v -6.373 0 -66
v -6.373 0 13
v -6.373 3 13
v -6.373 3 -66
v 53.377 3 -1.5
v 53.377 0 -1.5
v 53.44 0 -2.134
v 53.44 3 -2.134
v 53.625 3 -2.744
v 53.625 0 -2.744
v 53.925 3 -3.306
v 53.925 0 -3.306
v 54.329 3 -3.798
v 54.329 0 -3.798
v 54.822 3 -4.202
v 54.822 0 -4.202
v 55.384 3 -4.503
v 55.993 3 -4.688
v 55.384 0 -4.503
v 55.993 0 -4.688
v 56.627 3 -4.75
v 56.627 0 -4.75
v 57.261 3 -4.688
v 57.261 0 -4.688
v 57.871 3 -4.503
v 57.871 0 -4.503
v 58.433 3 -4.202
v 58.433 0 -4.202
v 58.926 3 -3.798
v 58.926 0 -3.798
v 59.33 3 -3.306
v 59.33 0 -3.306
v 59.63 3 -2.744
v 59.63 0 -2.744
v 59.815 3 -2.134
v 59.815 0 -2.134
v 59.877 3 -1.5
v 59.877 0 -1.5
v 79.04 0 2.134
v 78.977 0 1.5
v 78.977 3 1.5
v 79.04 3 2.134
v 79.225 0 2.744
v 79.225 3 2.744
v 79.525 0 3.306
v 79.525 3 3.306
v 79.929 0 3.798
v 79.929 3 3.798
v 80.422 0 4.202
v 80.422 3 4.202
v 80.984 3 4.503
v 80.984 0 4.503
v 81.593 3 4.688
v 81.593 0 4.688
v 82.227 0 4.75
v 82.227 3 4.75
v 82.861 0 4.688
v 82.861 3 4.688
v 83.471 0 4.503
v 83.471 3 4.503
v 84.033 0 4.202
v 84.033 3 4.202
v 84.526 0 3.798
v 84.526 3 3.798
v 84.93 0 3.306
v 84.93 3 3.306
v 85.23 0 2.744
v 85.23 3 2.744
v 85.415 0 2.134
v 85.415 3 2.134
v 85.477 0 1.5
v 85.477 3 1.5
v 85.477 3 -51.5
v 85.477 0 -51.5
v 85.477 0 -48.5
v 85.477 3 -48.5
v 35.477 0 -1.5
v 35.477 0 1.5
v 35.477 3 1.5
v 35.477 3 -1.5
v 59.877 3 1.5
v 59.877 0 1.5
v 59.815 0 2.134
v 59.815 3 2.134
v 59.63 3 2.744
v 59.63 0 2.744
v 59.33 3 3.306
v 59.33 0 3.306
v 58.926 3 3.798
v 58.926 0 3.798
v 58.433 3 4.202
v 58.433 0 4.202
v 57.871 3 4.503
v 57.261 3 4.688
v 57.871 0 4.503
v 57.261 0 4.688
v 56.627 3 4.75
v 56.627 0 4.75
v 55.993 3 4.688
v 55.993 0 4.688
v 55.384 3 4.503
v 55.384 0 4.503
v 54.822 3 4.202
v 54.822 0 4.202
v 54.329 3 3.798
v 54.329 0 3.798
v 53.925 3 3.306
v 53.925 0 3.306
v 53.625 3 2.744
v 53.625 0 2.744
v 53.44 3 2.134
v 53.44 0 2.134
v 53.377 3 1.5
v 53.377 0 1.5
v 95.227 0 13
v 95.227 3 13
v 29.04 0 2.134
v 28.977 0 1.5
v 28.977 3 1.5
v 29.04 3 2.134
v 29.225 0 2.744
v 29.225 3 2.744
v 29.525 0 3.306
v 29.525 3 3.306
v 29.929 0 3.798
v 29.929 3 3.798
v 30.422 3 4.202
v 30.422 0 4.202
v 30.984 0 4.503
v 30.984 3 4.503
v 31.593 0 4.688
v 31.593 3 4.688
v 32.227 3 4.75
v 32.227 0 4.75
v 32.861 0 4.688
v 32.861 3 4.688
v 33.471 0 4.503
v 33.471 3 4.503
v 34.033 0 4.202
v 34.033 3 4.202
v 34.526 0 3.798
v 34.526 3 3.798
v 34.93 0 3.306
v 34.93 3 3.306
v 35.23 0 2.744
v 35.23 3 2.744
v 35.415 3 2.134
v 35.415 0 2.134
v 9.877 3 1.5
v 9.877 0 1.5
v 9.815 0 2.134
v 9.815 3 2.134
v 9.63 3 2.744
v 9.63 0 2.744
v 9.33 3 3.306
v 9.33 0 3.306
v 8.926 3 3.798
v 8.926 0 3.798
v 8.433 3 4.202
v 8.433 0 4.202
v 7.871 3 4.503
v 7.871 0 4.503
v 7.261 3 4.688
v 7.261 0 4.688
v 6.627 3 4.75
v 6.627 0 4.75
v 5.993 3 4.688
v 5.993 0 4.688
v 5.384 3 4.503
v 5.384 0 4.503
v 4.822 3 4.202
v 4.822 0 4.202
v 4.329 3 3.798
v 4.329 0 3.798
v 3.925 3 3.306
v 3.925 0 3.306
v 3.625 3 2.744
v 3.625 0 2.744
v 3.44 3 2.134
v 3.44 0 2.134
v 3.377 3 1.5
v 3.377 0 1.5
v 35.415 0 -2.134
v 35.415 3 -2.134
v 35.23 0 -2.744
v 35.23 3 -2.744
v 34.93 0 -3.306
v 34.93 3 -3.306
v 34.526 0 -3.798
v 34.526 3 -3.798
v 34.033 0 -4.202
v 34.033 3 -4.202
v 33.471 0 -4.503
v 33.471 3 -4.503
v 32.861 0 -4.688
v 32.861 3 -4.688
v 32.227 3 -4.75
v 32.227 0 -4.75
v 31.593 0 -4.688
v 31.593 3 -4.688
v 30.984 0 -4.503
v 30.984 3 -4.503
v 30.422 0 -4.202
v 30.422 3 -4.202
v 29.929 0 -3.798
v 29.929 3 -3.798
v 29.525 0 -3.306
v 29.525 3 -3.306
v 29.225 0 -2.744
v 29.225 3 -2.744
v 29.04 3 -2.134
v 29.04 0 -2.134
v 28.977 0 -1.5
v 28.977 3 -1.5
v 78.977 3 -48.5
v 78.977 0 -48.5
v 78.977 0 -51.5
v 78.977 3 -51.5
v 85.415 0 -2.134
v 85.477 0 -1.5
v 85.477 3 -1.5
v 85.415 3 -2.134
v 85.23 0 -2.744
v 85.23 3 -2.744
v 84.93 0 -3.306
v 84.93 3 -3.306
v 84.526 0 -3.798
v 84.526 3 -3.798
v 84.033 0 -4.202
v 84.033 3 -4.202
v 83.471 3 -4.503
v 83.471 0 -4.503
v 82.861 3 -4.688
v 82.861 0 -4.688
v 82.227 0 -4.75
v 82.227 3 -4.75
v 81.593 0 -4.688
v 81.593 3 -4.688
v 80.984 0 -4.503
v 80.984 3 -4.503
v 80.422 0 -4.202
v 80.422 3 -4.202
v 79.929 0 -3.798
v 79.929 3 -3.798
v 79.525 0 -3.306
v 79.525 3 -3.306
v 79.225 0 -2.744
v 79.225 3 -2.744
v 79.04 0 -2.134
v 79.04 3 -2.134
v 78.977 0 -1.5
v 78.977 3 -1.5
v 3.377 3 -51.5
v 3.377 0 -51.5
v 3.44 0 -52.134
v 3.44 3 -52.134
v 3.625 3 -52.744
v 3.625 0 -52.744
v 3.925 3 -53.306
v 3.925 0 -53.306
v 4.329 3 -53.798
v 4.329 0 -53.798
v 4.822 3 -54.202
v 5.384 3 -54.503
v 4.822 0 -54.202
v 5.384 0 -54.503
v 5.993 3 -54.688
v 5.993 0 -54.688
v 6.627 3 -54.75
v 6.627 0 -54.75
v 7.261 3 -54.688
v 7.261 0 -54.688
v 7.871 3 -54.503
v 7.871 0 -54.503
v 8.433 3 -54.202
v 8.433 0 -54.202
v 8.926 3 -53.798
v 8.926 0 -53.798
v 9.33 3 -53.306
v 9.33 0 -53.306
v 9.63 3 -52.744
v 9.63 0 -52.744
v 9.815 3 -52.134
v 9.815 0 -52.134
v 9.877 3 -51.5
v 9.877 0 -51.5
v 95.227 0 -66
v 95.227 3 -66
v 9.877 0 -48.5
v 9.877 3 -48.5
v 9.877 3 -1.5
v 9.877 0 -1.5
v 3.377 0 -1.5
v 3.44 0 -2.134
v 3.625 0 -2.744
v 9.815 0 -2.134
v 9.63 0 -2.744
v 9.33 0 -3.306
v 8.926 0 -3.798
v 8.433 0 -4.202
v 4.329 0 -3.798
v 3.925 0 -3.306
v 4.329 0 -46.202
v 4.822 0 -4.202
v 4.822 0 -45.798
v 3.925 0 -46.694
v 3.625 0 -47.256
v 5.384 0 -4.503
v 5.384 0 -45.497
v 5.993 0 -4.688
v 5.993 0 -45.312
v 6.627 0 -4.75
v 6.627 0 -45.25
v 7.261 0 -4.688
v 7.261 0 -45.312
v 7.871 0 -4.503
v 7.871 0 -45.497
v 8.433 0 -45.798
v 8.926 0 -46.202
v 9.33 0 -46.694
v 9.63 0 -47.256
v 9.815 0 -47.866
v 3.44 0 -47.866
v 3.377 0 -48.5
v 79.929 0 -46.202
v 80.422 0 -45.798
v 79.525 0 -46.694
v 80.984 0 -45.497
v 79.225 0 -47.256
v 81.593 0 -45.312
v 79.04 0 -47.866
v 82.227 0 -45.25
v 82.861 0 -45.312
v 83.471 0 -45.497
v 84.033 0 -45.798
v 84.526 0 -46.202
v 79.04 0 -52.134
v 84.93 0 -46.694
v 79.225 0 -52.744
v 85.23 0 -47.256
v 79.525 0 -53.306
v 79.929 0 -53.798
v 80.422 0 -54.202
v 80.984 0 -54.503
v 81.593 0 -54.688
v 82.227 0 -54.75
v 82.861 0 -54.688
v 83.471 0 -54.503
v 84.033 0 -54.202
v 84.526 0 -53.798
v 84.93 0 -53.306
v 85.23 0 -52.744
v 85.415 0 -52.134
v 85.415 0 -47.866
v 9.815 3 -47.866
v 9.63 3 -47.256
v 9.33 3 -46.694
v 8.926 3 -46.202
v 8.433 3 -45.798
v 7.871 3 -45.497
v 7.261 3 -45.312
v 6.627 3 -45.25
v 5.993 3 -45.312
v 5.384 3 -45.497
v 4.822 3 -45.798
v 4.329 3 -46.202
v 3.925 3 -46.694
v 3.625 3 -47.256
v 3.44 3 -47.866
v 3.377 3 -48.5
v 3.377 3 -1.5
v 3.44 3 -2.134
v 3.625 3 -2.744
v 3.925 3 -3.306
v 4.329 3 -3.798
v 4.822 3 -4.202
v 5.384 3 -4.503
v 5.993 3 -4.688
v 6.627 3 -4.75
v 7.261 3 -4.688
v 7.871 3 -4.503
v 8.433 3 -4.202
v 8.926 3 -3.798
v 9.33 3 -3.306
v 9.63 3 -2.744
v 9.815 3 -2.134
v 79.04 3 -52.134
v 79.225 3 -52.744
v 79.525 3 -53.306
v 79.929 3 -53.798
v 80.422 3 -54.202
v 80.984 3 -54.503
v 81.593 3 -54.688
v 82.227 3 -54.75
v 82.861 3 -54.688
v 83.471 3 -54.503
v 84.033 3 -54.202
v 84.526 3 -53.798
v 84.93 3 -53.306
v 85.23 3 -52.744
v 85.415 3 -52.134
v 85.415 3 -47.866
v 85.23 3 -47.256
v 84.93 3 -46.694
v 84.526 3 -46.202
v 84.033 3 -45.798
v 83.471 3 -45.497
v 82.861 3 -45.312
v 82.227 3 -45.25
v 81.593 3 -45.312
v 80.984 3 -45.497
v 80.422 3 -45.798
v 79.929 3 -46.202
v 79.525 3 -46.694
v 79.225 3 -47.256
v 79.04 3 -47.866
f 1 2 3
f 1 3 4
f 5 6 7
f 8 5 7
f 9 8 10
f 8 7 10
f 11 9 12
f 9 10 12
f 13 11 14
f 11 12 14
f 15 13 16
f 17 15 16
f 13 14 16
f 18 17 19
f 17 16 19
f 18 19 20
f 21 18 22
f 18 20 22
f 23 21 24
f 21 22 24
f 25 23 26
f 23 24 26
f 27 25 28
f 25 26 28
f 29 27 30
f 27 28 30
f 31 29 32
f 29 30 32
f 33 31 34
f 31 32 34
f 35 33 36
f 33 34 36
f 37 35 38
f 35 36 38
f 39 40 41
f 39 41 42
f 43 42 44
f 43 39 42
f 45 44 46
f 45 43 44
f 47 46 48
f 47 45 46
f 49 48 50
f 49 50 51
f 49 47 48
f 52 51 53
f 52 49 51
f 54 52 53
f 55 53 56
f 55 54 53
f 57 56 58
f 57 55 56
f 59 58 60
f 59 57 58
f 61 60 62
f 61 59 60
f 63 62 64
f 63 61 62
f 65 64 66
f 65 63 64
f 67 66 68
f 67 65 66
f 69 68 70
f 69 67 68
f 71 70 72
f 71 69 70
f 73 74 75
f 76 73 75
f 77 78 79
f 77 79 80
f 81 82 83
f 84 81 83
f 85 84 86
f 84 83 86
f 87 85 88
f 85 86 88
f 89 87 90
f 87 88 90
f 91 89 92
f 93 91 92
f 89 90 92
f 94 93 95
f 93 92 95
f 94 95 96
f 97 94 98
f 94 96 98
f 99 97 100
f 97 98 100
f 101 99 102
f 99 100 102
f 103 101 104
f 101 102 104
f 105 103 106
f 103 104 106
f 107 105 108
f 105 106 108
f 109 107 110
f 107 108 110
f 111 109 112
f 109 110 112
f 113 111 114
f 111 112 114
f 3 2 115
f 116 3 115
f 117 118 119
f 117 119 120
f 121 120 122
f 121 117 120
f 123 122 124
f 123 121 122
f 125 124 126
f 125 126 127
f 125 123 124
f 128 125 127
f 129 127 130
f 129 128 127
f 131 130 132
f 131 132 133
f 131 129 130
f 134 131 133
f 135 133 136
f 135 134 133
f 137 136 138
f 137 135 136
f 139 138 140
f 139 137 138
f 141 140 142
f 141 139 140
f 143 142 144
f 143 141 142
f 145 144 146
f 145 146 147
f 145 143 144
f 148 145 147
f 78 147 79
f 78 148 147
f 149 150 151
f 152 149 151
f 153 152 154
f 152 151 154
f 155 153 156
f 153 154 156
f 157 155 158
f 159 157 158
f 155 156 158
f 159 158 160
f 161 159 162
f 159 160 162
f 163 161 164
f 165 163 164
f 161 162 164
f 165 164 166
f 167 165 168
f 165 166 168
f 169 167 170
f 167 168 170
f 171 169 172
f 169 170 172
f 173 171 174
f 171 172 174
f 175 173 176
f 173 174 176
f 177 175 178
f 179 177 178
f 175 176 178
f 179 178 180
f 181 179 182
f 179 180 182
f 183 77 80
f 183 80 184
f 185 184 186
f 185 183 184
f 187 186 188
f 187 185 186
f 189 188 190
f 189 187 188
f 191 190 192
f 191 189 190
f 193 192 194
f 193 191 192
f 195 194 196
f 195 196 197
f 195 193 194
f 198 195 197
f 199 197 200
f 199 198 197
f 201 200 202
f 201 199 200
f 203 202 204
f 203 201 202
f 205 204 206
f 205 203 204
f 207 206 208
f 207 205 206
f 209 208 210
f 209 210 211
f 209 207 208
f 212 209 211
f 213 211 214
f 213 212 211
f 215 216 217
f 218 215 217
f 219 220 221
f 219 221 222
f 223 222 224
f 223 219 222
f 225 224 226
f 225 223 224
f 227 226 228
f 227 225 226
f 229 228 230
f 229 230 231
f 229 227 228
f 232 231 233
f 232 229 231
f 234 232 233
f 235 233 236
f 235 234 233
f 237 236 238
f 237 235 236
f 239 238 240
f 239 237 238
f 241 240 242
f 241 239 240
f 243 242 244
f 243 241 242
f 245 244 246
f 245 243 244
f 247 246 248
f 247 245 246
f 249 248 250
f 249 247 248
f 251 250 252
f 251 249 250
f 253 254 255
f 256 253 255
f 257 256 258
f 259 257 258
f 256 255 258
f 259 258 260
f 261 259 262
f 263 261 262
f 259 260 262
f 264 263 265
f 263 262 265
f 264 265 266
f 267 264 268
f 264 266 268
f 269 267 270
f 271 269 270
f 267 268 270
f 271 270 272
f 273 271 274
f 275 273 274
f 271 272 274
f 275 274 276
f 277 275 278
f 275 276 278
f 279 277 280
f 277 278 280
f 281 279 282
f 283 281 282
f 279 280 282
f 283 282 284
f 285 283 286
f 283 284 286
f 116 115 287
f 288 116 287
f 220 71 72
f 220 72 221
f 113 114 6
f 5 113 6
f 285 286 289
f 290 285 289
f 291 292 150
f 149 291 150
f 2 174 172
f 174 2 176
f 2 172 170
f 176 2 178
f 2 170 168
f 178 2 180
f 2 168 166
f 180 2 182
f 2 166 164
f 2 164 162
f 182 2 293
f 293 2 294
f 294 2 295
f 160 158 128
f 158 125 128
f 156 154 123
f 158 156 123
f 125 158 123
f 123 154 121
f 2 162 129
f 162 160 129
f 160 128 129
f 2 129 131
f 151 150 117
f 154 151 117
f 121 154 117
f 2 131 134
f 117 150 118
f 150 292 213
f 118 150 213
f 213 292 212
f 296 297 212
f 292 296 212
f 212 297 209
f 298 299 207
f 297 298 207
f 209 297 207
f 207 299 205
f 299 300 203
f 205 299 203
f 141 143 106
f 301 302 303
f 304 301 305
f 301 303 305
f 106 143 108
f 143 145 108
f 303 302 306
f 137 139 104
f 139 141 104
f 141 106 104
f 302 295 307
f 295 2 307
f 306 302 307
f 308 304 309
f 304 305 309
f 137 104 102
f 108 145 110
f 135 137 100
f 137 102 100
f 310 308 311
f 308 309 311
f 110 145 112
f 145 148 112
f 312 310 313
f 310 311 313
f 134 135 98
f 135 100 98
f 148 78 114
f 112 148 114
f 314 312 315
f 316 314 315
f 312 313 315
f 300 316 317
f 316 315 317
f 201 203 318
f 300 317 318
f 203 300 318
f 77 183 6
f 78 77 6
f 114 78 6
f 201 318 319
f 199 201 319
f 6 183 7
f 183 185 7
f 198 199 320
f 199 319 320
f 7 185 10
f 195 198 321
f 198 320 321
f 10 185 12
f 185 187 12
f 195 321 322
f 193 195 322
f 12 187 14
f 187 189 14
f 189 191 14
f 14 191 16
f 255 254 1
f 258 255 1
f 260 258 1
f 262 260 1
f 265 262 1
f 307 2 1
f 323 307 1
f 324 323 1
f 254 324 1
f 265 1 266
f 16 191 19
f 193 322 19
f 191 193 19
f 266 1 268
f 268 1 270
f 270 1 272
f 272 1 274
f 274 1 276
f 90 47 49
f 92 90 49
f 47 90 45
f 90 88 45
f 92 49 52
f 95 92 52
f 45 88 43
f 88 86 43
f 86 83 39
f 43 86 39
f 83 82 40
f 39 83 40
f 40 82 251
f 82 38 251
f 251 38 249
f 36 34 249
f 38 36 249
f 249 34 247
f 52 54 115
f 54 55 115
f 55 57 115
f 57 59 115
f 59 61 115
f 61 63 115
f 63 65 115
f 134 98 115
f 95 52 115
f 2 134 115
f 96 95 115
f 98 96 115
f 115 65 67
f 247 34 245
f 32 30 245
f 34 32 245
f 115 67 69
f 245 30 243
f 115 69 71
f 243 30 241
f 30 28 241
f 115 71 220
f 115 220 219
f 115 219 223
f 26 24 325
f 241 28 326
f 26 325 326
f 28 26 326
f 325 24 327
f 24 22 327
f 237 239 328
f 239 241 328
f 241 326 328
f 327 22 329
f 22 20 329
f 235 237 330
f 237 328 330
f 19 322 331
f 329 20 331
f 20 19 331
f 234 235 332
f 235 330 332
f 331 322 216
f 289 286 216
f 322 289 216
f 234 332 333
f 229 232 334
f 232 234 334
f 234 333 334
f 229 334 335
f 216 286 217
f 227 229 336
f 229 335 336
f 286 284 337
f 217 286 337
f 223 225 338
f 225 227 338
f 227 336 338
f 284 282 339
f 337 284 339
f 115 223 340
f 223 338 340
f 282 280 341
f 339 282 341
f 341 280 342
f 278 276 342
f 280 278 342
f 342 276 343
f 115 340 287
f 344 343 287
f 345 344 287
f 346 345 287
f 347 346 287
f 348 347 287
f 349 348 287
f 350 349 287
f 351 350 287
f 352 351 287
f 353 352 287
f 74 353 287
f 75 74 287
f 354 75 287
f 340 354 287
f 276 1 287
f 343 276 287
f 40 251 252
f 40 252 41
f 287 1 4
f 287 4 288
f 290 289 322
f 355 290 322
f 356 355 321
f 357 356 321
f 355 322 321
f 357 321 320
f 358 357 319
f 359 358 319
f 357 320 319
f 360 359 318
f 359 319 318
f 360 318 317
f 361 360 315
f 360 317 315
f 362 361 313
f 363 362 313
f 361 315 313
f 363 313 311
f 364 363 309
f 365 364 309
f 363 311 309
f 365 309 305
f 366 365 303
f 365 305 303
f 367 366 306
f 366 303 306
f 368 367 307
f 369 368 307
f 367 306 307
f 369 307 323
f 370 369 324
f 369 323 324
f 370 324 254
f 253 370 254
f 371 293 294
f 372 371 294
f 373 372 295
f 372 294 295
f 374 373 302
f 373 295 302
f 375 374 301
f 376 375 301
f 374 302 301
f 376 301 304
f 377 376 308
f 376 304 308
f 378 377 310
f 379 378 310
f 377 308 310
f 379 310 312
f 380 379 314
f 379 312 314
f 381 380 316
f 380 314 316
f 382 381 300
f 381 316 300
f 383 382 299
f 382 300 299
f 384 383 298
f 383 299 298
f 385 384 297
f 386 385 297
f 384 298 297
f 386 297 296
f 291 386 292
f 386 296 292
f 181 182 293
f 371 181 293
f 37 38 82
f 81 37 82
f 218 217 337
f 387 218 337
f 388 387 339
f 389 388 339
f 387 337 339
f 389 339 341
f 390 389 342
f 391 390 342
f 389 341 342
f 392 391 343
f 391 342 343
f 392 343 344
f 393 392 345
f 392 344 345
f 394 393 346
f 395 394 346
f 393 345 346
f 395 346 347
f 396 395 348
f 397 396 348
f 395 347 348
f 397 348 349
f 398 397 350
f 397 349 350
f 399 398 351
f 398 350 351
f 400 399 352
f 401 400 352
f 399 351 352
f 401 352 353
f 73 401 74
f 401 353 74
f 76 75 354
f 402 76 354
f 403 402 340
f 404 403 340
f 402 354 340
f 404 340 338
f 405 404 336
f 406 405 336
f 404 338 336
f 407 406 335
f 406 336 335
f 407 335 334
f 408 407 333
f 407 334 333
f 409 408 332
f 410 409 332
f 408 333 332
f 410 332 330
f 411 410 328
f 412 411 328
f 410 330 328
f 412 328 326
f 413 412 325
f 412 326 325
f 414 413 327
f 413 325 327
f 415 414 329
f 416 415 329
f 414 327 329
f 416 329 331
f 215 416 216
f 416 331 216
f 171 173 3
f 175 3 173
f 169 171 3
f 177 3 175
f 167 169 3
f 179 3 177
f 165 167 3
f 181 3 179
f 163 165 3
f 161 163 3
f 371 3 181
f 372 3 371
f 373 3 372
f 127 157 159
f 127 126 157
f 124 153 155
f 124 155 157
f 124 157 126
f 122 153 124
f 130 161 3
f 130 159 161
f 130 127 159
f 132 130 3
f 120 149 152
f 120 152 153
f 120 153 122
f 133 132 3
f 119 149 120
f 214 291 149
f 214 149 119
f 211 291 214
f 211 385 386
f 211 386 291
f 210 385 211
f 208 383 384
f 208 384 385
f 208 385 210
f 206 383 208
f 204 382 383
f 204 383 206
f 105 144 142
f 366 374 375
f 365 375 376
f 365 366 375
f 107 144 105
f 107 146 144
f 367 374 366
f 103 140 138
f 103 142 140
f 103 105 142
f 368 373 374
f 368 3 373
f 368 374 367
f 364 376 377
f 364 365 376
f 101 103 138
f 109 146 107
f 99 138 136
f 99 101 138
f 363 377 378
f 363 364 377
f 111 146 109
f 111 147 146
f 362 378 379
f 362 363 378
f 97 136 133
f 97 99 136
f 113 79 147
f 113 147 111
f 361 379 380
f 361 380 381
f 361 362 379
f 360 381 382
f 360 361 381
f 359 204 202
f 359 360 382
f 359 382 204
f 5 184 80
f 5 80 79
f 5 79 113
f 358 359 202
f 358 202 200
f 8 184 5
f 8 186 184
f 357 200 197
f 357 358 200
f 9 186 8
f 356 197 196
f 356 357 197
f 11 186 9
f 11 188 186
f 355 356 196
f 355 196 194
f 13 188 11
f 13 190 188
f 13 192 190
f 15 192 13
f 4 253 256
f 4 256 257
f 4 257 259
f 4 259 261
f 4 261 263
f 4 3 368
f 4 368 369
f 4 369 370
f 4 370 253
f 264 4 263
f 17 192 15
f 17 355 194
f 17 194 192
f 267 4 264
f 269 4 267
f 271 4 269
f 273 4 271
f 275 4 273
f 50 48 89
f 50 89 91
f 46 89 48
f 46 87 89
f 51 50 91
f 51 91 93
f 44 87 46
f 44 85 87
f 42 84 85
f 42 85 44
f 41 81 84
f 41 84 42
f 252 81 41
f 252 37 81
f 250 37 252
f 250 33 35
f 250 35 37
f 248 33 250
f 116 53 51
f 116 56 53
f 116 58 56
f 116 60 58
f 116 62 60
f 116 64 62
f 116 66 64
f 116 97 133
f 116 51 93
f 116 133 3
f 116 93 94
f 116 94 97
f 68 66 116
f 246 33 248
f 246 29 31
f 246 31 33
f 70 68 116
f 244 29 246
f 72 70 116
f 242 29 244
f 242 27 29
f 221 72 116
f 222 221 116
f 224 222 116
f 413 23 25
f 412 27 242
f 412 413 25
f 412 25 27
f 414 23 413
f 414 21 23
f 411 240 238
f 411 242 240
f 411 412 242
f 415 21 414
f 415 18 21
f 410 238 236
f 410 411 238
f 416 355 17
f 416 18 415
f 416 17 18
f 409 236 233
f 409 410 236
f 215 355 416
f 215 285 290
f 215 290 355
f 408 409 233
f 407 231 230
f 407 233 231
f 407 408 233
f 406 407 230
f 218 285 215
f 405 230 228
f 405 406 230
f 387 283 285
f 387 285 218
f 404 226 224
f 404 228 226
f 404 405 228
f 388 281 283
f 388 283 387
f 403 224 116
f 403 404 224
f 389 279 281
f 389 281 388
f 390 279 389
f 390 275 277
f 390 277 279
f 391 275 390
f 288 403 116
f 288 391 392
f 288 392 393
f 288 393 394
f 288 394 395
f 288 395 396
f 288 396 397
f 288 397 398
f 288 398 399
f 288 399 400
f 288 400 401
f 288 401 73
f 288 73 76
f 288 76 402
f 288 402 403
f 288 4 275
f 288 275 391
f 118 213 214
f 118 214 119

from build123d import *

# Parameters (mm, degrees)
SKETCH1_W           = 101.6
SKETCH1_H           = 79
BOSS_EXTRUDE1_DEPTH = 3


with BuildPart() as part:
    # Sketch1 → Boss-Extrude1 (new body)
    with BuildSketch(Plane(origin=(0, 0, 0), x_dir=(1, 0, 0), z_dir=(0, 1, 0))):
        with Locations((44.42740929, 26.5)):
            Rectangle(SKETCH1_W, SKETCH1_H)
        with BuildLine():
            Line((9.87740929, 51.5), (9.87740929, 48.5))
            ThreePointArc((9.87740929, 48.5), (6.62740929, 45.25), (3.37740929, 48.5))
            Line((3.37740929, 48.5), (3.37740929, 51.5))
            ThreePointArc((3.37740929, 51.5), (6.62740929, 54.75), (9.87740929, 51.5))
        make_face(mode=Mode.SUBTRACT)
        with BuildLine():
            Line((9.87740929, 1.5), (9.87740929, -1.5))
            ThreePointArc((9.87740929, -1.5), (6.62740929, -4.75), (3.37740929, -1.5))
            Line((3.37740929, -1.5), (3.37740929, 1.5))
            ThreePointArc((3.37740929, 1.5), (6.62740929, 4.75), (9.87740929, 1.5))
        make_face(mode=Mode.SUBTRACT)
        with BuildLine():
            Line((59.87740929, 1.5), (59.87740929, -1.5))
            ThreePointArc((59.87740929, -1.5), (56.62740929, -4.75), (53.37740929, -1.5))
            Line((53.37740929, -1.5), (53.37740929, 1.5))
            ThreePointArc((53.37740929, 1.5), (56.62740929, 4.75), (59.87740929, 1.5))
        make_face(mode=Mode.SUBTRACT)
        with BuildLine():
            Line((85.47740929, 51.5), (85.47740929, 48.5))
            ThreePointArc((85.47740929, 48.5), (82.22740929, 45.25), (78.97740929, 48.5))
            Line((78.97740929, 48.5), (78.97740929, 51.5))
            ThreePointArc((78.97740929, 51.5), (82.22740929, 54.75), (85.47740929, 51.5))
        make_face(mode=Mode.SUBTRACT)
        with BuildLine():
            Line((78.97740929, 1.5), (78.97740929, -1.5))
            ThreePointArc((78.97740929, -1.5), (82.22740929, -4.75), (85.47740929, -1.5))
            Line((85.47740929, -1.5), (85.47740929, 1.5))
            ThreePointArc((85.47740929, 1.5), (82.22740929, 4.75), (78.97740929, 1.5))
        make_face(mode=Mode.SUBTRACT)
        with BuildLine():
            Line((28.97740929, 1.5), (28.97740929, -1.5))
            ThreePointArc((28.97740929, -1.5), (32.22740929, -4.75), (35.47740929, -1.5))
            Line((35.47740929, -1.5), (35.47740929, 1.5))
            ThreePointArc((35.47740929, 1.5), (32.22740929, 4.75), (28.97740929, 1.5))
        make_face(mode=Mode.SUBTRACT)
    extrude(amount=BOSS_EXTRUDE1_DEPTH)


solid = part.part
